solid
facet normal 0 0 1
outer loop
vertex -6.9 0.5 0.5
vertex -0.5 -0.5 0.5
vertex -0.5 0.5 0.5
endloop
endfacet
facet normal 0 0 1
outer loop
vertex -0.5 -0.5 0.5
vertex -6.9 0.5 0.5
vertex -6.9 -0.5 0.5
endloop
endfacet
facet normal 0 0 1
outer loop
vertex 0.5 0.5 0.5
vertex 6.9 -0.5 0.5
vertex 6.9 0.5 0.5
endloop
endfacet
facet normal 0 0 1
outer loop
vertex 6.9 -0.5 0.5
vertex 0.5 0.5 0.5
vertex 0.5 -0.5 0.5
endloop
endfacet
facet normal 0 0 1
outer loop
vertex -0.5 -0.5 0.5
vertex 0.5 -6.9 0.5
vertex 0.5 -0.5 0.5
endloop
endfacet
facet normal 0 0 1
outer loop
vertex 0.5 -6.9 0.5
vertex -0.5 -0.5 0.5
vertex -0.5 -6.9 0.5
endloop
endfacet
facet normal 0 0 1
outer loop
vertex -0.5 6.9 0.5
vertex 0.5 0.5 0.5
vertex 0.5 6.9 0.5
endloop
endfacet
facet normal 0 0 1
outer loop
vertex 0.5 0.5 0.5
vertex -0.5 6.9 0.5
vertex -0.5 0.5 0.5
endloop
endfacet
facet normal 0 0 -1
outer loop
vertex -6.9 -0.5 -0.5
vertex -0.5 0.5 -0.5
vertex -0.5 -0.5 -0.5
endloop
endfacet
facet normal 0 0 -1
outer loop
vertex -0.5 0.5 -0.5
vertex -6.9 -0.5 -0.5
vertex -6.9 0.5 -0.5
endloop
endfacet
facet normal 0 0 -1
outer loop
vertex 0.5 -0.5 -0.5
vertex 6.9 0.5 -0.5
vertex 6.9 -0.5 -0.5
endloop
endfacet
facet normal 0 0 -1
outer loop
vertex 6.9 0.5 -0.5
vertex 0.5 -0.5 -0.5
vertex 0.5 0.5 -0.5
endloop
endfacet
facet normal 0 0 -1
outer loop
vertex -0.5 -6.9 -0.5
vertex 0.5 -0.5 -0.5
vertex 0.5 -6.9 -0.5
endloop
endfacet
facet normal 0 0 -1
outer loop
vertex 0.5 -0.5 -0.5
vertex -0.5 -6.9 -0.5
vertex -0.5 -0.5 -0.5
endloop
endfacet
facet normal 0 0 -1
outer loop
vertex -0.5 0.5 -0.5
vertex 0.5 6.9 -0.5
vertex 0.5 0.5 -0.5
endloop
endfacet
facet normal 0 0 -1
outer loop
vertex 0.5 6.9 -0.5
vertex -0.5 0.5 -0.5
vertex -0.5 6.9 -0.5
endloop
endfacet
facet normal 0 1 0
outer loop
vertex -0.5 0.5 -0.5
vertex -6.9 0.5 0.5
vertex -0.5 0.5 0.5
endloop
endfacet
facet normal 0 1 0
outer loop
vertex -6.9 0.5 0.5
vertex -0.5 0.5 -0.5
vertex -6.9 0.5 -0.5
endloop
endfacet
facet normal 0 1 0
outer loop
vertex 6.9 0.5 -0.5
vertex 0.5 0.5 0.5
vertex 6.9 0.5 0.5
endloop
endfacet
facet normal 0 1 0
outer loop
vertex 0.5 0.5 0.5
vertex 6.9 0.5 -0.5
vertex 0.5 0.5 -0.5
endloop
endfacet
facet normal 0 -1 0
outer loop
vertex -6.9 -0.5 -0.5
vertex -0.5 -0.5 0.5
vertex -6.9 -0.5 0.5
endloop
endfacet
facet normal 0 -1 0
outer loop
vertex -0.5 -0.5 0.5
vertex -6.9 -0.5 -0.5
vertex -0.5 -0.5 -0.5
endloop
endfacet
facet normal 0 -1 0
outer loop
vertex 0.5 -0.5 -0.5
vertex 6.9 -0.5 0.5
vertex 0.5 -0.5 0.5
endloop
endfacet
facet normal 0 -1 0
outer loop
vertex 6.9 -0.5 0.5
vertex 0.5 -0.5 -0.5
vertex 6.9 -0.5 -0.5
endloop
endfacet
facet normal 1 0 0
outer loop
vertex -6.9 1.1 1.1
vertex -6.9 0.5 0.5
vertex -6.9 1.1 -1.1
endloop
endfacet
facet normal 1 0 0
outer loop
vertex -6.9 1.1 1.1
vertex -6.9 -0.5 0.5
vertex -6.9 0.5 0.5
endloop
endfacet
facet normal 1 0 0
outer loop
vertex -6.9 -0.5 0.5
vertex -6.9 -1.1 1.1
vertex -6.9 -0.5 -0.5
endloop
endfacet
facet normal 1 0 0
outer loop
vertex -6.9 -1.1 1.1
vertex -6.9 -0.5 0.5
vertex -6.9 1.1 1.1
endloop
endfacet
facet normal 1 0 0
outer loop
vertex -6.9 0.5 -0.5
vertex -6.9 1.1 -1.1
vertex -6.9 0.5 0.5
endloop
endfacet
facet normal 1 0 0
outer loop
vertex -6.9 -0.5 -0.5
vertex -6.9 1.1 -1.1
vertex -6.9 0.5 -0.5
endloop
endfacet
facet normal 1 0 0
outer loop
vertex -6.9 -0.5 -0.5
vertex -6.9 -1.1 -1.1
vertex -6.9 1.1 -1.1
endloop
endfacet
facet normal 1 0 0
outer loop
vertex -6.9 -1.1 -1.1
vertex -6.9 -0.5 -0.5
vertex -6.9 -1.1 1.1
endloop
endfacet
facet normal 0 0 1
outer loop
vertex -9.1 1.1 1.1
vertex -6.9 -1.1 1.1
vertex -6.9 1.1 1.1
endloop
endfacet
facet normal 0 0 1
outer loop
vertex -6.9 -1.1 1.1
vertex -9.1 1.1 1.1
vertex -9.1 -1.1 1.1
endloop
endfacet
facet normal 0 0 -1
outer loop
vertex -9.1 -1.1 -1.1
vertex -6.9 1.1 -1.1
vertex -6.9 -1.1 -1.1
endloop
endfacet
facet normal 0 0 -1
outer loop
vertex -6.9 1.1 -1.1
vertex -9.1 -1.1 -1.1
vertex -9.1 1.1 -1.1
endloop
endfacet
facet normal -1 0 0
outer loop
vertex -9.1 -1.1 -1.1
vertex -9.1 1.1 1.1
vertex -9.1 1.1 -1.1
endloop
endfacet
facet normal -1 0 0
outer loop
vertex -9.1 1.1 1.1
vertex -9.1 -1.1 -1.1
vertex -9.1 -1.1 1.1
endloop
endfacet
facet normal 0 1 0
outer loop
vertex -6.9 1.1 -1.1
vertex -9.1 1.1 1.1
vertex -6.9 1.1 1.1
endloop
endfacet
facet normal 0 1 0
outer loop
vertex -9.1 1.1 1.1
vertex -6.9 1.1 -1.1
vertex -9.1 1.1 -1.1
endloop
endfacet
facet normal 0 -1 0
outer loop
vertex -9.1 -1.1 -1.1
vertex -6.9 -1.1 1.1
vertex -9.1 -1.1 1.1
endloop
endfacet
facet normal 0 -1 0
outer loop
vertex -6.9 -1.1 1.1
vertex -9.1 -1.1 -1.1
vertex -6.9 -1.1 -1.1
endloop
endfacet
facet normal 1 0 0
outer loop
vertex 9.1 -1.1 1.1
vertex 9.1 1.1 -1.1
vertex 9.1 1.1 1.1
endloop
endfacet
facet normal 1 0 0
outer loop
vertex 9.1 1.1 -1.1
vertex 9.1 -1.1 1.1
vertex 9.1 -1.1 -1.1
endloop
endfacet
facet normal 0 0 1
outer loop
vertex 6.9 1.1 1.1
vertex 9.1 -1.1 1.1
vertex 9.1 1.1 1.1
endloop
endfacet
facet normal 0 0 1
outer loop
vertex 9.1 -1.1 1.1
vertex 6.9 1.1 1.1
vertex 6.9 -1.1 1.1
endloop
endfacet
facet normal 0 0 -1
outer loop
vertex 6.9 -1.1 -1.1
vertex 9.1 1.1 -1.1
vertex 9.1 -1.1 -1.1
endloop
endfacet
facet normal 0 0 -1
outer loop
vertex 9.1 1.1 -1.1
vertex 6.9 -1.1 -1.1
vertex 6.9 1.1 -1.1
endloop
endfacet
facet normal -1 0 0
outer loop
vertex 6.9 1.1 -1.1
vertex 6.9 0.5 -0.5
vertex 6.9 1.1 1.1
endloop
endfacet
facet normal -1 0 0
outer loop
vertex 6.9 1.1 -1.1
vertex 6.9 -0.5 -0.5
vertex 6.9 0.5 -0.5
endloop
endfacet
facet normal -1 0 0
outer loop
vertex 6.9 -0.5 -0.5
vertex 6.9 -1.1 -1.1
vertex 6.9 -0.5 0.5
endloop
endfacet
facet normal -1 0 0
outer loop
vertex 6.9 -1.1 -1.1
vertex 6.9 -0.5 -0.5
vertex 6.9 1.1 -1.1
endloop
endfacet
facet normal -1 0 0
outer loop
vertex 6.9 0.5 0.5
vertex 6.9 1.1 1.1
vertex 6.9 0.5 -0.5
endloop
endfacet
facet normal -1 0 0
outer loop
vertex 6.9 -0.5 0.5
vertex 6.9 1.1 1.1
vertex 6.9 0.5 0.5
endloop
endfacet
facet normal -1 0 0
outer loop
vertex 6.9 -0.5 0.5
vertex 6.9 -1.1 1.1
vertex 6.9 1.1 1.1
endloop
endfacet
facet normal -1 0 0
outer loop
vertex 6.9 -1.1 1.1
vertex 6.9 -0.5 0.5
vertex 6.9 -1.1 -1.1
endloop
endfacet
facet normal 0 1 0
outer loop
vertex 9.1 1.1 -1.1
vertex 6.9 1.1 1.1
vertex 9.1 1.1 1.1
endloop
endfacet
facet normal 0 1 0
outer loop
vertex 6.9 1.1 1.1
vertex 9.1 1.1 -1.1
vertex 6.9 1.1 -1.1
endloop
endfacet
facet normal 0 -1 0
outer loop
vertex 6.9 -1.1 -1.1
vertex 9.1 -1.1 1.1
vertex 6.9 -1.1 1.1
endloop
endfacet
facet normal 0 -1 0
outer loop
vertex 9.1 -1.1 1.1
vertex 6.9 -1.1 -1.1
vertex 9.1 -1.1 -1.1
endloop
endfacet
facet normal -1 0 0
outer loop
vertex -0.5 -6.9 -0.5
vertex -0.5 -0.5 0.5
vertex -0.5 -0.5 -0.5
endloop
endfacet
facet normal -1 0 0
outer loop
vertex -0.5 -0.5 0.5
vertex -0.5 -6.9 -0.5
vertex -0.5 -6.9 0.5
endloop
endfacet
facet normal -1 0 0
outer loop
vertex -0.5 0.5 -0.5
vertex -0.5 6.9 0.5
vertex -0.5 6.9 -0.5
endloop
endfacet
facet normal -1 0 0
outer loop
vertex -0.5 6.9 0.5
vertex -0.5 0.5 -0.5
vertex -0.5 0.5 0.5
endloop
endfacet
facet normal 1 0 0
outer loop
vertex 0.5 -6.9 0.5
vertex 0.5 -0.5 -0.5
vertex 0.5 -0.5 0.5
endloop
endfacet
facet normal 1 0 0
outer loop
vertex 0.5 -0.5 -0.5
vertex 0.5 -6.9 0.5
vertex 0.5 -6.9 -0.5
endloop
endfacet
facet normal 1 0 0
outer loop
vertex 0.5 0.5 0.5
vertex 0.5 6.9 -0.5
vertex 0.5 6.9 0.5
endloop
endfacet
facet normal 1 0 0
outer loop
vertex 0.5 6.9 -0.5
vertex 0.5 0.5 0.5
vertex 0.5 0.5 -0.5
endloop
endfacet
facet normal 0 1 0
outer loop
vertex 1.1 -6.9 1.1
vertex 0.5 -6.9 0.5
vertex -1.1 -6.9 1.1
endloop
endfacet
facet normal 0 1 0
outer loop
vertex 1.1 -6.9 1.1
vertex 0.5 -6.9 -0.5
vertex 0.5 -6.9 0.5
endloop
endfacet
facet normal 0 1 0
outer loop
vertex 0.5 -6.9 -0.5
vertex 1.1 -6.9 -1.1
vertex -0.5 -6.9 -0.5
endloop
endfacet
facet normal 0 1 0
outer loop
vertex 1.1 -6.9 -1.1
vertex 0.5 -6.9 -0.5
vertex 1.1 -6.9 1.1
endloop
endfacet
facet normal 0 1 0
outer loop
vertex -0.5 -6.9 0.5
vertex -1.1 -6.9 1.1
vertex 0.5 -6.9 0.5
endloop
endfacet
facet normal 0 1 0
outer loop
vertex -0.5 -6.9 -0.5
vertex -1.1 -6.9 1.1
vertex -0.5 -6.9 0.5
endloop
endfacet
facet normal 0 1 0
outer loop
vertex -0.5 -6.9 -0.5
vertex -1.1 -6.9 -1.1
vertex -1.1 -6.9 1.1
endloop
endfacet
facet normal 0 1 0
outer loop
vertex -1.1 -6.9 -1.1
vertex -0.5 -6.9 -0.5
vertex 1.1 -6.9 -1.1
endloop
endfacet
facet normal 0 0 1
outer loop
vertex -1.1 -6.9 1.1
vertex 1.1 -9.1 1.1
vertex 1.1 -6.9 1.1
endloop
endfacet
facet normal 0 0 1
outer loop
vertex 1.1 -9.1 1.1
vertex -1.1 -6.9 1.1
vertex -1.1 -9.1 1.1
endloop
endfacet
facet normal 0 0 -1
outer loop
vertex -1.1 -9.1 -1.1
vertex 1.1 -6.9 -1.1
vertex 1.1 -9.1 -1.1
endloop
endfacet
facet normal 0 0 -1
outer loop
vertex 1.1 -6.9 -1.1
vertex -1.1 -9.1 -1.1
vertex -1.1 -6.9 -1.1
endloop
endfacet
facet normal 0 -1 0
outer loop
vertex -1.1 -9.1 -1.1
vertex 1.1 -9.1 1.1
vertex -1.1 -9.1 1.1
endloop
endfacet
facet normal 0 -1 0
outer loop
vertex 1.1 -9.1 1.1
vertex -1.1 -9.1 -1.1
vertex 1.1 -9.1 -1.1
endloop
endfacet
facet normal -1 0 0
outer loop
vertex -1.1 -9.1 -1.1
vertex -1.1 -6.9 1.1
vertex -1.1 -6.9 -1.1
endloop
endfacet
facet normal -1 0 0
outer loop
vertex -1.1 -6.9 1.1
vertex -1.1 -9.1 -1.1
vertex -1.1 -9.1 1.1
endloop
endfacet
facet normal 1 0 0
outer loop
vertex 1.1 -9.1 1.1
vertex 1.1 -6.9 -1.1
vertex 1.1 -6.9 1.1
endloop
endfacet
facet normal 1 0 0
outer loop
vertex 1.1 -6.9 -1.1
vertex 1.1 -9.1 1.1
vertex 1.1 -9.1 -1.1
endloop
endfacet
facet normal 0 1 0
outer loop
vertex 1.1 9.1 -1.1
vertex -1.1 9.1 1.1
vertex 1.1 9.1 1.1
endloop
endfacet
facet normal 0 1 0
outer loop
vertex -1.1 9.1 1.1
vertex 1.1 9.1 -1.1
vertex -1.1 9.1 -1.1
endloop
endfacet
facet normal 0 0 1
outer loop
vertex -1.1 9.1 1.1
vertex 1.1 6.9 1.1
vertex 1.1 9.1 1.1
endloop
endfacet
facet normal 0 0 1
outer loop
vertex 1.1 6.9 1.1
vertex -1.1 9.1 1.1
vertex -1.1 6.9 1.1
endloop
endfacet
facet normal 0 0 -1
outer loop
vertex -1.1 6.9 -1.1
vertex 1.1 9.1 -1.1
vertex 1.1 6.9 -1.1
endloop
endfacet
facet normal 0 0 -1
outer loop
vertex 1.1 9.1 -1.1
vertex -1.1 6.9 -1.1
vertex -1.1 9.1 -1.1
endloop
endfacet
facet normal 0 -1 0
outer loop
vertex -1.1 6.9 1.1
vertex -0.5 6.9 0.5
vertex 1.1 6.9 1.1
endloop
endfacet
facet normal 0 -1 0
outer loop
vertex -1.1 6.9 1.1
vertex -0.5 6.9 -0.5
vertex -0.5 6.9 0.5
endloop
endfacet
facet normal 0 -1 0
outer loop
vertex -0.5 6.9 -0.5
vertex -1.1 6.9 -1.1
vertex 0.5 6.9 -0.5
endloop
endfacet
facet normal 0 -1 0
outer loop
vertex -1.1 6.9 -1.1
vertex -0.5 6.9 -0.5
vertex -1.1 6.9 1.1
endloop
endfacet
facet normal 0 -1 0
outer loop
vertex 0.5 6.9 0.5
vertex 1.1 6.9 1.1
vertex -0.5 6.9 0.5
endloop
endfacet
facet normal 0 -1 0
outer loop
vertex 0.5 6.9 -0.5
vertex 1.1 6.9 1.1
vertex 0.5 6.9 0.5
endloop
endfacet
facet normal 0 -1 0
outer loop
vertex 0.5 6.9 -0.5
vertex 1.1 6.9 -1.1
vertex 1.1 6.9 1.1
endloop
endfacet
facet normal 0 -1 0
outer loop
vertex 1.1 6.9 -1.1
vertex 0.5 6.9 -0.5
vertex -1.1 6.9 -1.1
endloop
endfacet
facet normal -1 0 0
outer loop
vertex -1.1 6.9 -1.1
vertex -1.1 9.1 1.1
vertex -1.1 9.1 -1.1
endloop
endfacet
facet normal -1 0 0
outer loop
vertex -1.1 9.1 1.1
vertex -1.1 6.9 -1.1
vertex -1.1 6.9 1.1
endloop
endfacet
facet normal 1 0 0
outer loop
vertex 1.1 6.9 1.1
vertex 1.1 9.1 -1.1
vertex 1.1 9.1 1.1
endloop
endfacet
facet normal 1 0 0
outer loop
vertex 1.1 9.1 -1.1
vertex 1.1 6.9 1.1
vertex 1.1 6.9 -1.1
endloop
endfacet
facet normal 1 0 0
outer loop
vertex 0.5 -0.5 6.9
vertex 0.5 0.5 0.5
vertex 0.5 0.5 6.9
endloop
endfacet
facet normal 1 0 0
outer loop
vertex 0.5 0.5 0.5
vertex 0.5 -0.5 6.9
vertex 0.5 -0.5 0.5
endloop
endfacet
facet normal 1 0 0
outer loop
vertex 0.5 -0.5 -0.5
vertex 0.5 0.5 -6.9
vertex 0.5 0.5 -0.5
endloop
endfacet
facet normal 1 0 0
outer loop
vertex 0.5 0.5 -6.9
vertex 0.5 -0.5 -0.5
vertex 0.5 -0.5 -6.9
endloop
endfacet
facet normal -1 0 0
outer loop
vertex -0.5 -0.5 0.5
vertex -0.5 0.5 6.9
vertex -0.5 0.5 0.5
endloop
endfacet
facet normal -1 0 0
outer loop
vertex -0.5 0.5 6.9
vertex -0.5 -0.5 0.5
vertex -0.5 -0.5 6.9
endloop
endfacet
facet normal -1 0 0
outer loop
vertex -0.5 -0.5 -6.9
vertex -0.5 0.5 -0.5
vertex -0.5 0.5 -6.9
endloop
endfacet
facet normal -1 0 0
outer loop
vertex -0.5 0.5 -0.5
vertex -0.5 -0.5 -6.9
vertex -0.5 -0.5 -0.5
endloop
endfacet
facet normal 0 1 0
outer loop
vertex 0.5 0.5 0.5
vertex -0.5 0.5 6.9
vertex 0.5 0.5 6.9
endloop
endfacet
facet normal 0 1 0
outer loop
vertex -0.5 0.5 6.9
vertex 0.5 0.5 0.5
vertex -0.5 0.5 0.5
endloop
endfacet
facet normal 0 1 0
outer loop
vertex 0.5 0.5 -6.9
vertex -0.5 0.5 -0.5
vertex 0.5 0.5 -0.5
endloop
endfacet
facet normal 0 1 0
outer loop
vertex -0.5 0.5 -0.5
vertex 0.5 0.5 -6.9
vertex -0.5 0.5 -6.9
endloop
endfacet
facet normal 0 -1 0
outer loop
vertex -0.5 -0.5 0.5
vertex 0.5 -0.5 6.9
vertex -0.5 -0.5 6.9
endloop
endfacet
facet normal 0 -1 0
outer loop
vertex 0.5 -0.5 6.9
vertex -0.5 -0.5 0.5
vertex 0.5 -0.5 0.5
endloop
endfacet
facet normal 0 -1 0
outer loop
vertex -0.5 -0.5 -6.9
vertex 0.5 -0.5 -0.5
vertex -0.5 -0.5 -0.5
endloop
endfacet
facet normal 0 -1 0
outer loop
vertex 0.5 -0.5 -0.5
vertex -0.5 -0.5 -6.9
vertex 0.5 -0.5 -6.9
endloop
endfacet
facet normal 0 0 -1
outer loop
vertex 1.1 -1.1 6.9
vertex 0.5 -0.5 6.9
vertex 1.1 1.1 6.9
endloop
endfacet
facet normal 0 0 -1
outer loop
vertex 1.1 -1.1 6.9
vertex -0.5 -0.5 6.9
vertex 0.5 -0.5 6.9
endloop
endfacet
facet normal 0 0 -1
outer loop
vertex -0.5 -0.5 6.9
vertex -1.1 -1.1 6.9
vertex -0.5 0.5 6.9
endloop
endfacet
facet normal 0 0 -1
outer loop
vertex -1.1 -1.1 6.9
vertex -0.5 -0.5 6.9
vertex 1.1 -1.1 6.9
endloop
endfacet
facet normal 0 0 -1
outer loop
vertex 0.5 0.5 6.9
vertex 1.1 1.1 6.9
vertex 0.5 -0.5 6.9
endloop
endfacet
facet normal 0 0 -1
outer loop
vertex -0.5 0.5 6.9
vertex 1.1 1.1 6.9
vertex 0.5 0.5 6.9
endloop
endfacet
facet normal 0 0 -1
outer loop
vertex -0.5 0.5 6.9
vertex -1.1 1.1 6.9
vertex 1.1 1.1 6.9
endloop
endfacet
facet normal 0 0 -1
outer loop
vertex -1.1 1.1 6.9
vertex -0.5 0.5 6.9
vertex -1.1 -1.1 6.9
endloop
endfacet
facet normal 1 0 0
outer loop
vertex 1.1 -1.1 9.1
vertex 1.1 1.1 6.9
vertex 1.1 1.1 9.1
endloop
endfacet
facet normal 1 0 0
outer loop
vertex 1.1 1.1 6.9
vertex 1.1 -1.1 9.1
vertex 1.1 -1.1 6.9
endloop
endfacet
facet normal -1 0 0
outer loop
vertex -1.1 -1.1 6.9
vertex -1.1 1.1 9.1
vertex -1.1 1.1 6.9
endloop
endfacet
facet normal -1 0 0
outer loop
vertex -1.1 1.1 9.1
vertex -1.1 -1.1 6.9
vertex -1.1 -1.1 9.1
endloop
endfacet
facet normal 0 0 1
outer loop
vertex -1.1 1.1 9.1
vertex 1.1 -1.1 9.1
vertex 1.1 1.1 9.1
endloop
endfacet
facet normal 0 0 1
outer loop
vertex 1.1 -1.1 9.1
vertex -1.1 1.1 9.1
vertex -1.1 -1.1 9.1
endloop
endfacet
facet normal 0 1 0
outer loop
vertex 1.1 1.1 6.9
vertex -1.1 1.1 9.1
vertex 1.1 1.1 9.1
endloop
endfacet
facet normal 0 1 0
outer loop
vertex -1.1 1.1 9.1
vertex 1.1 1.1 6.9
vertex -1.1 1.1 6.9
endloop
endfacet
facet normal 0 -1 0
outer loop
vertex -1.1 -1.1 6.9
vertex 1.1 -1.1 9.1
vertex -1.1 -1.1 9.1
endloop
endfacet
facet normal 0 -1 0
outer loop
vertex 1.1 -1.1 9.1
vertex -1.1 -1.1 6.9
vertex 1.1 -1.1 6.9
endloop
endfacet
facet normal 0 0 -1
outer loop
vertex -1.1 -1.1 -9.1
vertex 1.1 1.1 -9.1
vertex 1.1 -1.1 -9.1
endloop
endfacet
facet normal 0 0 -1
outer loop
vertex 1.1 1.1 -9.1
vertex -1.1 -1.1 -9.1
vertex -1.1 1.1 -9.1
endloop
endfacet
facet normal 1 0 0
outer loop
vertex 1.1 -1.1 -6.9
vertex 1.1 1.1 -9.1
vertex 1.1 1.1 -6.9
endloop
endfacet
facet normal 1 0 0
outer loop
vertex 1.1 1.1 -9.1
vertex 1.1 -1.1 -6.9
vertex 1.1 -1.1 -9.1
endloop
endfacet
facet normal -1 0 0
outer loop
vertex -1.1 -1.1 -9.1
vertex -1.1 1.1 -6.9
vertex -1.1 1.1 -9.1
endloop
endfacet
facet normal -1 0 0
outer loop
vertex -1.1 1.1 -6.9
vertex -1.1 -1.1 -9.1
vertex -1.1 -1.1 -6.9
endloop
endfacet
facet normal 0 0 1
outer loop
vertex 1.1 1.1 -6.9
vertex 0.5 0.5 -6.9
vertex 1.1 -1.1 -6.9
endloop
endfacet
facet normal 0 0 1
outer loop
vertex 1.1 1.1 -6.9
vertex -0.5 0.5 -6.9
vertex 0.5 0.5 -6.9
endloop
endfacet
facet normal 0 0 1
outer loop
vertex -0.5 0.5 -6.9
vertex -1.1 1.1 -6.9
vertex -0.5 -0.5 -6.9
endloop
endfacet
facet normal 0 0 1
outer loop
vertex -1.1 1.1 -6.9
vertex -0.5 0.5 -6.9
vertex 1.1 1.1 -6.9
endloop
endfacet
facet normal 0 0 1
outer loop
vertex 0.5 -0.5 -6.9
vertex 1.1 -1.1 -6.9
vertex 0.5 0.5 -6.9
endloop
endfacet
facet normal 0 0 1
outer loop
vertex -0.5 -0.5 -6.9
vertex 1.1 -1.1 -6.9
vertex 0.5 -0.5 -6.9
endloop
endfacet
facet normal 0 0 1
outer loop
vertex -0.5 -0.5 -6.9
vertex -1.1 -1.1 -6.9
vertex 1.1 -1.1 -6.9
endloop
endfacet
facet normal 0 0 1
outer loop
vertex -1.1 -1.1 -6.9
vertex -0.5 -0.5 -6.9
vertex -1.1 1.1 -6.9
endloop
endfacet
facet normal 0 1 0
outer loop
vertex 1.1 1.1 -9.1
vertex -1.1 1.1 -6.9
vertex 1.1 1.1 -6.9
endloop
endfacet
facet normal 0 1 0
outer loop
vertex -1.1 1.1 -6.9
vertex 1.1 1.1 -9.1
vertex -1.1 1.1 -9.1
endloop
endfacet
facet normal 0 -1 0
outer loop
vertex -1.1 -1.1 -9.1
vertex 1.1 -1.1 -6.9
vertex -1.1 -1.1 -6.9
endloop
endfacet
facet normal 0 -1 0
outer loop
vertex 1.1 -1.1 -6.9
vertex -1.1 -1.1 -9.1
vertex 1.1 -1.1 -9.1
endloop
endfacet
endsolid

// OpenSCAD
module ScaleToolIcon() {
  module Axis_() {
    kL = 8;
    kC = 2.2;
    cube([2 * kL, 1, 1], center = true);
    translate([-kL, 0, 0]) cube([kC, kC, kC], center = true);
    translate([ kL, 0, 0]) cube([kC, kC, kC], center = true);
  }

  Axis_();
  rotate([0, 0, 90]) Axis_();
  rotate([0, 90, 0]) Axis_();
}

ScaleToolIcon($fn = 72);
